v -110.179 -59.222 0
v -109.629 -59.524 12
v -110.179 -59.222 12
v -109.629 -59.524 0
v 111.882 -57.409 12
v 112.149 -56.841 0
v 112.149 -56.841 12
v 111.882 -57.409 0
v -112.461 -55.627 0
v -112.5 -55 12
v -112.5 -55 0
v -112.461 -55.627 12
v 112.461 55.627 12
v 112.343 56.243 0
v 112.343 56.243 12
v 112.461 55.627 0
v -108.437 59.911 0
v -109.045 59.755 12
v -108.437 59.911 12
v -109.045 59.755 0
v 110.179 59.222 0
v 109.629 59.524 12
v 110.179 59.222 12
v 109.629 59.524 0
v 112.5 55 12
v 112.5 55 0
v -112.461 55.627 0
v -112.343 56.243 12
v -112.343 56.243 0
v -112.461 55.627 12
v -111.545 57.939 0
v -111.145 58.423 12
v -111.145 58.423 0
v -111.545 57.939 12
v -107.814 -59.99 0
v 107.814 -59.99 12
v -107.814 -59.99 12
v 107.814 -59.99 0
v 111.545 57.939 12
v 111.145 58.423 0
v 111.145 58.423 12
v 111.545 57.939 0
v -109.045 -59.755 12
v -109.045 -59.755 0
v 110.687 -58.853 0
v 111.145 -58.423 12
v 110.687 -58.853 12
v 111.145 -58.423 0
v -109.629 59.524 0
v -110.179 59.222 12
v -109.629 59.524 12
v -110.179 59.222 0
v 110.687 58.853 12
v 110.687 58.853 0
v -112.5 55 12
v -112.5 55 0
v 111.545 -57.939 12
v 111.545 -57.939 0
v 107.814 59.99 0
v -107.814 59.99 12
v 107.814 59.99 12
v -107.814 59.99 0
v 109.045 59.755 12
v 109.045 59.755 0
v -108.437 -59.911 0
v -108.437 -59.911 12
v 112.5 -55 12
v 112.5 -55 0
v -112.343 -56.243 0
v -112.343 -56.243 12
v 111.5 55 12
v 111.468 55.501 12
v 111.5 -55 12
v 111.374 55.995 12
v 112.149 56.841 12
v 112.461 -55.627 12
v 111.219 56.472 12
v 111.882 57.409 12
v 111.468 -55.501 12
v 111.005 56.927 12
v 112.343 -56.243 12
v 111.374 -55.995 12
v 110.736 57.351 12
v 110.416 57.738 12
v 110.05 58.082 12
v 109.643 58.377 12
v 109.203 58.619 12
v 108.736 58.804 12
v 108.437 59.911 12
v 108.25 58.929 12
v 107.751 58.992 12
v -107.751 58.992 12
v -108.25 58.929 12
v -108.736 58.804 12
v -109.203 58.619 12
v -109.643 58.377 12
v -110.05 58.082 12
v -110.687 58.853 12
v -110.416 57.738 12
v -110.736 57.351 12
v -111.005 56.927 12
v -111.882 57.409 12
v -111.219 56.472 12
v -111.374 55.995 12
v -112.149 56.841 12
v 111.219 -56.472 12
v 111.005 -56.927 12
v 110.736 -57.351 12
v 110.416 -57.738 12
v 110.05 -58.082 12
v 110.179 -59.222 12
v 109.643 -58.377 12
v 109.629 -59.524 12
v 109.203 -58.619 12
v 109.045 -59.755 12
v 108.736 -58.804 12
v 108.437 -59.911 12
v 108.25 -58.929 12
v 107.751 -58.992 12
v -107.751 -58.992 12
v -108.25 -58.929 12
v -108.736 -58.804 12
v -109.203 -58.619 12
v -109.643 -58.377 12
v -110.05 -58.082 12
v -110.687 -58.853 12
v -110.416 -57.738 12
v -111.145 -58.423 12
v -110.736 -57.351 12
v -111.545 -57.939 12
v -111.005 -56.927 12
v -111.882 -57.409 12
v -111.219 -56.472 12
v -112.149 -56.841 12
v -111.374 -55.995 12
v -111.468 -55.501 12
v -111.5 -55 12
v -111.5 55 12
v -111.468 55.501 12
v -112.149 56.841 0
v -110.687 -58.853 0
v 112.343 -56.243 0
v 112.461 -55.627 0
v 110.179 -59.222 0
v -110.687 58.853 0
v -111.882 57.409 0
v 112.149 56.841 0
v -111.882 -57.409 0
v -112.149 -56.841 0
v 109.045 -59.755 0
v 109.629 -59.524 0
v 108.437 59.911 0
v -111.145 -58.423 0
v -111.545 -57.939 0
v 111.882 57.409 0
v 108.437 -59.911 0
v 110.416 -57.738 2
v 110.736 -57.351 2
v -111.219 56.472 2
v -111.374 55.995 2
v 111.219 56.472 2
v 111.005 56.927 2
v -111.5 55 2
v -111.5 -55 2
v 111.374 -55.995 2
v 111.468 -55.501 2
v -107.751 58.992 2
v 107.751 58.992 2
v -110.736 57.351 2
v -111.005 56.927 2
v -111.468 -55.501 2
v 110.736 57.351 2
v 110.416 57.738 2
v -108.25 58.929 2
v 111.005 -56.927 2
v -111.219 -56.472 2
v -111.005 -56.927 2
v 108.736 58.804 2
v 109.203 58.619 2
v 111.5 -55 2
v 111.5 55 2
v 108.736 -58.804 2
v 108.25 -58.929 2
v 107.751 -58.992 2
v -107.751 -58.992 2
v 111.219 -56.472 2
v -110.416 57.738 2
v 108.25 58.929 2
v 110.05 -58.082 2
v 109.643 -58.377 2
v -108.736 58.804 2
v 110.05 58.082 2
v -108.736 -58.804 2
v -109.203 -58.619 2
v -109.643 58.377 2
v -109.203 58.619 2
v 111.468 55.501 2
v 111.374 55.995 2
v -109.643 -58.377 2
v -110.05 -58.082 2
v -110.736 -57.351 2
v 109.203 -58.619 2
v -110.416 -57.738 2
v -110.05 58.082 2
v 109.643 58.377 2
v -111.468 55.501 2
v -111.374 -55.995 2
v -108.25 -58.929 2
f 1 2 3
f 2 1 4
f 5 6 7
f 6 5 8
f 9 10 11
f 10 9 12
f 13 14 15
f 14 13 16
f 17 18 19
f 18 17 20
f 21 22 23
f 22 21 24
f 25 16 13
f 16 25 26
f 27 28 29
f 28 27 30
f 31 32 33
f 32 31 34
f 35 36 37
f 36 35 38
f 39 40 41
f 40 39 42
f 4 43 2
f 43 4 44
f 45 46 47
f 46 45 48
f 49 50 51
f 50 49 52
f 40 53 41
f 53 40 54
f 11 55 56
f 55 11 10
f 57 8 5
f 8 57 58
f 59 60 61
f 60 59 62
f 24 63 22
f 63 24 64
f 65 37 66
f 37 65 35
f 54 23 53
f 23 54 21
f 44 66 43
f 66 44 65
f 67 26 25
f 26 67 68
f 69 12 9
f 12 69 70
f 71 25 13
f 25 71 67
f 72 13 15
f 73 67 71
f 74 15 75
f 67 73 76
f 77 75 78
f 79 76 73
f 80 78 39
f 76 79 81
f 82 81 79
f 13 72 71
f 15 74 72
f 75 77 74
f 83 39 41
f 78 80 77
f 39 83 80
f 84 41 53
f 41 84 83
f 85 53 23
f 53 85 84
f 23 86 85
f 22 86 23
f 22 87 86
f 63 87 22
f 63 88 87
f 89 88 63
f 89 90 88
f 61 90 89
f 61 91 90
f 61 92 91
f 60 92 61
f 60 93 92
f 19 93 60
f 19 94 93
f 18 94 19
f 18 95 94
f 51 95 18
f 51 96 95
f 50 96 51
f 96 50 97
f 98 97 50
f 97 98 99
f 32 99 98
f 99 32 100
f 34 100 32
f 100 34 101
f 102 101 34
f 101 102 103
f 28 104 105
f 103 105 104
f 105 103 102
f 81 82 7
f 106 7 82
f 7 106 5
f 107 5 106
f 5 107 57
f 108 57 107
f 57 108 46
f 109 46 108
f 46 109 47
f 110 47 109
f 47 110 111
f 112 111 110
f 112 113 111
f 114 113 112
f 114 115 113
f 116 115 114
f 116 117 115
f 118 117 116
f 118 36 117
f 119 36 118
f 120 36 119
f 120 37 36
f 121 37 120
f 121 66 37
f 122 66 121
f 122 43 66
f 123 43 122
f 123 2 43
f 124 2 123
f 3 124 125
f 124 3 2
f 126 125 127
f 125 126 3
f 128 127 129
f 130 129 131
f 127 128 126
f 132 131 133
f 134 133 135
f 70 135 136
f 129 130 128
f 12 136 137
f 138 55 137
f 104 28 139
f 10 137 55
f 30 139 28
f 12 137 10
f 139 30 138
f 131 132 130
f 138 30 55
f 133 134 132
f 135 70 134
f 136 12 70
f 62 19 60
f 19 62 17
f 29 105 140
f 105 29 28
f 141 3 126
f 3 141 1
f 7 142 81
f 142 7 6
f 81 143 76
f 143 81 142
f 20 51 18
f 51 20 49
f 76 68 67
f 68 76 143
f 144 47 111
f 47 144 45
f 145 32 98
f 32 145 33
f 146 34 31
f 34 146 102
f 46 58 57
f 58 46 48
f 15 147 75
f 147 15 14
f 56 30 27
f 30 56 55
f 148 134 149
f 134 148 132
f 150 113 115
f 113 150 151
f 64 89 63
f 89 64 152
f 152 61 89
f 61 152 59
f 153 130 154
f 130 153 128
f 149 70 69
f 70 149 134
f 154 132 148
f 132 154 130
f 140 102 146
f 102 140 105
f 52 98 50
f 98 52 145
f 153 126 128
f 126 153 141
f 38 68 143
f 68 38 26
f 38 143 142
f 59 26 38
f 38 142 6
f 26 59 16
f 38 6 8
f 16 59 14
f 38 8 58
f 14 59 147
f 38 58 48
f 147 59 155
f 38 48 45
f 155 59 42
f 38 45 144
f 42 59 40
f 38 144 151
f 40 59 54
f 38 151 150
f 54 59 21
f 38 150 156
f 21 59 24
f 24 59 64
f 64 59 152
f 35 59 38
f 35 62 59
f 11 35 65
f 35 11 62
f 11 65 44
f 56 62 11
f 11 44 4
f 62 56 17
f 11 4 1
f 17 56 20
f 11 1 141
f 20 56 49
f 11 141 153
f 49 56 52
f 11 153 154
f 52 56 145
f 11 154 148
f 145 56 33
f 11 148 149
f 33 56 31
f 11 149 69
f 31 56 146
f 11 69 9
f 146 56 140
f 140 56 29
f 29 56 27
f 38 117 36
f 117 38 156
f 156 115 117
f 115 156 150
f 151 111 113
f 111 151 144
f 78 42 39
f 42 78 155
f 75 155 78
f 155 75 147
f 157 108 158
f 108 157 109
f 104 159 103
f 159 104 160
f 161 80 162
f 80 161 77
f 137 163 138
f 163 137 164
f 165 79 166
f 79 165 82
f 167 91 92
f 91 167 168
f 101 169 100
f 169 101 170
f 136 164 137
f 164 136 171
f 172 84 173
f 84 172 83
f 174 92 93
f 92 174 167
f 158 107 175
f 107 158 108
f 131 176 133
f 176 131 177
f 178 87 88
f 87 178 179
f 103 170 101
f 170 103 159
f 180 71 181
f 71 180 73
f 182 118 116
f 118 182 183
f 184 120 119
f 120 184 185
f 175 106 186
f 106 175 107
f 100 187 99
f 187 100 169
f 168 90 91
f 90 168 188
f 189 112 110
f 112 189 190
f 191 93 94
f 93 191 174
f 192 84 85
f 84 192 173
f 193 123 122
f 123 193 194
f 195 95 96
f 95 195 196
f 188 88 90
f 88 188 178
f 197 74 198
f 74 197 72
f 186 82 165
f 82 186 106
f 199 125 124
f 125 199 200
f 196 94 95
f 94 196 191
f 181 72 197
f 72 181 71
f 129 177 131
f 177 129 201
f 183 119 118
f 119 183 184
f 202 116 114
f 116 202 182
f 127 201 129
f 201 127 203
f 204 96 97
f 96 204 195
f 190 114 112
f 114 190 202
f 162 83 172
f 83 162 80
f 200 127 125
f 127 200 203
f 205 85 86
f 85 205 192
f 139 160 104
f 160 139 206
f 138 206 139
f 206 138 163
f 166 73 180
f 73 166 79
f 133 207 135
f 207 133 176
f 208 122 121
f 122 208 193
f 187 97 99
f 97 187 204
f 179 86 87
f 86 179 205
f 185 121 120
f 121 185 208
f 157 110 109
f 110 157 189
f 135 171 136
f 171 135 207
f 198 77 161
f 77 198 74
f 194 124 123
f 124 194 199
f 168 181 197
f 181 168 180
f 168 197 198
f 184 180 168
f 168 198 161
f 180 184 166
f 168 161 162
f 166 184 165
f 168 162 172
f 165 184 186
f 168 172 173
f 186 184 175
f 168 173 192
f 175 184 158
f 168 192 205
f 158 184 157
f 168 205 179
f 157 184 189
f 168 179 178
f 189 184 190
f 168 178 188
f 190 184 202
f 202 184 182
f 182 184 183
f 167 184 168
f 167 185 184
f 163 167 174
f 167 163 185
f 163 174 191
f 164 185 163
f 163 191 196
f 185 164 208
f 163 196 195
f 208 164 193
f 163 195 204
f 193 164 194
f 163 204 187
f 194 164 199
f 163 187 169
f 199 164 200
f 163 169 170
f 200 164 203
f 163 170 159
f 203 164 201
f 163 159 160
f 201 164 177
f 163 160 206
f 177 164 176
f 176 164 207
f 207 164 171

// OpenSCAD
$fn = 50;


difference() {
	union() {
		hull() {
			translate(v = [-107.5000000000, 55.0000000000, 0]) {
				cylinder(h = 12, r = 5);
			}
			translate(v = [107.5000000000, 55.0000000000, 0]) {
				cylinder(h = 12, r = 5);
			}
			translate(v = [-107.5000000000, -55.0000000000, 0]) {
				cylinder(h = 12, r = 5);
			}
			translate(v = [107.5000000000, -55.0000000000, 0]) {
				cylinder(h = 12, r = 5);
			}
		}
	}
	union() {
		translate(v = [0, 0, 2]) {
			hull() {
				translate(v = [-107.5000000000, 55.0000000000, 0]) {
					cylinder(h = 10, r = 4);
				}
				translate(v = [107.5000000000, 55.0000000000, 0]) {
					cylinder(h = 10, r = 4);
				}
				translate(v = [-107.5000000000, -55.0000000000, 0]) {
					cylinder(h = 10, r = 4);
				}
				translate(v = [107.5000000000, -55.0000000000, 0]) {
					cylinder(h = 10, r = 4);
				}
			}
		}
	}
}
